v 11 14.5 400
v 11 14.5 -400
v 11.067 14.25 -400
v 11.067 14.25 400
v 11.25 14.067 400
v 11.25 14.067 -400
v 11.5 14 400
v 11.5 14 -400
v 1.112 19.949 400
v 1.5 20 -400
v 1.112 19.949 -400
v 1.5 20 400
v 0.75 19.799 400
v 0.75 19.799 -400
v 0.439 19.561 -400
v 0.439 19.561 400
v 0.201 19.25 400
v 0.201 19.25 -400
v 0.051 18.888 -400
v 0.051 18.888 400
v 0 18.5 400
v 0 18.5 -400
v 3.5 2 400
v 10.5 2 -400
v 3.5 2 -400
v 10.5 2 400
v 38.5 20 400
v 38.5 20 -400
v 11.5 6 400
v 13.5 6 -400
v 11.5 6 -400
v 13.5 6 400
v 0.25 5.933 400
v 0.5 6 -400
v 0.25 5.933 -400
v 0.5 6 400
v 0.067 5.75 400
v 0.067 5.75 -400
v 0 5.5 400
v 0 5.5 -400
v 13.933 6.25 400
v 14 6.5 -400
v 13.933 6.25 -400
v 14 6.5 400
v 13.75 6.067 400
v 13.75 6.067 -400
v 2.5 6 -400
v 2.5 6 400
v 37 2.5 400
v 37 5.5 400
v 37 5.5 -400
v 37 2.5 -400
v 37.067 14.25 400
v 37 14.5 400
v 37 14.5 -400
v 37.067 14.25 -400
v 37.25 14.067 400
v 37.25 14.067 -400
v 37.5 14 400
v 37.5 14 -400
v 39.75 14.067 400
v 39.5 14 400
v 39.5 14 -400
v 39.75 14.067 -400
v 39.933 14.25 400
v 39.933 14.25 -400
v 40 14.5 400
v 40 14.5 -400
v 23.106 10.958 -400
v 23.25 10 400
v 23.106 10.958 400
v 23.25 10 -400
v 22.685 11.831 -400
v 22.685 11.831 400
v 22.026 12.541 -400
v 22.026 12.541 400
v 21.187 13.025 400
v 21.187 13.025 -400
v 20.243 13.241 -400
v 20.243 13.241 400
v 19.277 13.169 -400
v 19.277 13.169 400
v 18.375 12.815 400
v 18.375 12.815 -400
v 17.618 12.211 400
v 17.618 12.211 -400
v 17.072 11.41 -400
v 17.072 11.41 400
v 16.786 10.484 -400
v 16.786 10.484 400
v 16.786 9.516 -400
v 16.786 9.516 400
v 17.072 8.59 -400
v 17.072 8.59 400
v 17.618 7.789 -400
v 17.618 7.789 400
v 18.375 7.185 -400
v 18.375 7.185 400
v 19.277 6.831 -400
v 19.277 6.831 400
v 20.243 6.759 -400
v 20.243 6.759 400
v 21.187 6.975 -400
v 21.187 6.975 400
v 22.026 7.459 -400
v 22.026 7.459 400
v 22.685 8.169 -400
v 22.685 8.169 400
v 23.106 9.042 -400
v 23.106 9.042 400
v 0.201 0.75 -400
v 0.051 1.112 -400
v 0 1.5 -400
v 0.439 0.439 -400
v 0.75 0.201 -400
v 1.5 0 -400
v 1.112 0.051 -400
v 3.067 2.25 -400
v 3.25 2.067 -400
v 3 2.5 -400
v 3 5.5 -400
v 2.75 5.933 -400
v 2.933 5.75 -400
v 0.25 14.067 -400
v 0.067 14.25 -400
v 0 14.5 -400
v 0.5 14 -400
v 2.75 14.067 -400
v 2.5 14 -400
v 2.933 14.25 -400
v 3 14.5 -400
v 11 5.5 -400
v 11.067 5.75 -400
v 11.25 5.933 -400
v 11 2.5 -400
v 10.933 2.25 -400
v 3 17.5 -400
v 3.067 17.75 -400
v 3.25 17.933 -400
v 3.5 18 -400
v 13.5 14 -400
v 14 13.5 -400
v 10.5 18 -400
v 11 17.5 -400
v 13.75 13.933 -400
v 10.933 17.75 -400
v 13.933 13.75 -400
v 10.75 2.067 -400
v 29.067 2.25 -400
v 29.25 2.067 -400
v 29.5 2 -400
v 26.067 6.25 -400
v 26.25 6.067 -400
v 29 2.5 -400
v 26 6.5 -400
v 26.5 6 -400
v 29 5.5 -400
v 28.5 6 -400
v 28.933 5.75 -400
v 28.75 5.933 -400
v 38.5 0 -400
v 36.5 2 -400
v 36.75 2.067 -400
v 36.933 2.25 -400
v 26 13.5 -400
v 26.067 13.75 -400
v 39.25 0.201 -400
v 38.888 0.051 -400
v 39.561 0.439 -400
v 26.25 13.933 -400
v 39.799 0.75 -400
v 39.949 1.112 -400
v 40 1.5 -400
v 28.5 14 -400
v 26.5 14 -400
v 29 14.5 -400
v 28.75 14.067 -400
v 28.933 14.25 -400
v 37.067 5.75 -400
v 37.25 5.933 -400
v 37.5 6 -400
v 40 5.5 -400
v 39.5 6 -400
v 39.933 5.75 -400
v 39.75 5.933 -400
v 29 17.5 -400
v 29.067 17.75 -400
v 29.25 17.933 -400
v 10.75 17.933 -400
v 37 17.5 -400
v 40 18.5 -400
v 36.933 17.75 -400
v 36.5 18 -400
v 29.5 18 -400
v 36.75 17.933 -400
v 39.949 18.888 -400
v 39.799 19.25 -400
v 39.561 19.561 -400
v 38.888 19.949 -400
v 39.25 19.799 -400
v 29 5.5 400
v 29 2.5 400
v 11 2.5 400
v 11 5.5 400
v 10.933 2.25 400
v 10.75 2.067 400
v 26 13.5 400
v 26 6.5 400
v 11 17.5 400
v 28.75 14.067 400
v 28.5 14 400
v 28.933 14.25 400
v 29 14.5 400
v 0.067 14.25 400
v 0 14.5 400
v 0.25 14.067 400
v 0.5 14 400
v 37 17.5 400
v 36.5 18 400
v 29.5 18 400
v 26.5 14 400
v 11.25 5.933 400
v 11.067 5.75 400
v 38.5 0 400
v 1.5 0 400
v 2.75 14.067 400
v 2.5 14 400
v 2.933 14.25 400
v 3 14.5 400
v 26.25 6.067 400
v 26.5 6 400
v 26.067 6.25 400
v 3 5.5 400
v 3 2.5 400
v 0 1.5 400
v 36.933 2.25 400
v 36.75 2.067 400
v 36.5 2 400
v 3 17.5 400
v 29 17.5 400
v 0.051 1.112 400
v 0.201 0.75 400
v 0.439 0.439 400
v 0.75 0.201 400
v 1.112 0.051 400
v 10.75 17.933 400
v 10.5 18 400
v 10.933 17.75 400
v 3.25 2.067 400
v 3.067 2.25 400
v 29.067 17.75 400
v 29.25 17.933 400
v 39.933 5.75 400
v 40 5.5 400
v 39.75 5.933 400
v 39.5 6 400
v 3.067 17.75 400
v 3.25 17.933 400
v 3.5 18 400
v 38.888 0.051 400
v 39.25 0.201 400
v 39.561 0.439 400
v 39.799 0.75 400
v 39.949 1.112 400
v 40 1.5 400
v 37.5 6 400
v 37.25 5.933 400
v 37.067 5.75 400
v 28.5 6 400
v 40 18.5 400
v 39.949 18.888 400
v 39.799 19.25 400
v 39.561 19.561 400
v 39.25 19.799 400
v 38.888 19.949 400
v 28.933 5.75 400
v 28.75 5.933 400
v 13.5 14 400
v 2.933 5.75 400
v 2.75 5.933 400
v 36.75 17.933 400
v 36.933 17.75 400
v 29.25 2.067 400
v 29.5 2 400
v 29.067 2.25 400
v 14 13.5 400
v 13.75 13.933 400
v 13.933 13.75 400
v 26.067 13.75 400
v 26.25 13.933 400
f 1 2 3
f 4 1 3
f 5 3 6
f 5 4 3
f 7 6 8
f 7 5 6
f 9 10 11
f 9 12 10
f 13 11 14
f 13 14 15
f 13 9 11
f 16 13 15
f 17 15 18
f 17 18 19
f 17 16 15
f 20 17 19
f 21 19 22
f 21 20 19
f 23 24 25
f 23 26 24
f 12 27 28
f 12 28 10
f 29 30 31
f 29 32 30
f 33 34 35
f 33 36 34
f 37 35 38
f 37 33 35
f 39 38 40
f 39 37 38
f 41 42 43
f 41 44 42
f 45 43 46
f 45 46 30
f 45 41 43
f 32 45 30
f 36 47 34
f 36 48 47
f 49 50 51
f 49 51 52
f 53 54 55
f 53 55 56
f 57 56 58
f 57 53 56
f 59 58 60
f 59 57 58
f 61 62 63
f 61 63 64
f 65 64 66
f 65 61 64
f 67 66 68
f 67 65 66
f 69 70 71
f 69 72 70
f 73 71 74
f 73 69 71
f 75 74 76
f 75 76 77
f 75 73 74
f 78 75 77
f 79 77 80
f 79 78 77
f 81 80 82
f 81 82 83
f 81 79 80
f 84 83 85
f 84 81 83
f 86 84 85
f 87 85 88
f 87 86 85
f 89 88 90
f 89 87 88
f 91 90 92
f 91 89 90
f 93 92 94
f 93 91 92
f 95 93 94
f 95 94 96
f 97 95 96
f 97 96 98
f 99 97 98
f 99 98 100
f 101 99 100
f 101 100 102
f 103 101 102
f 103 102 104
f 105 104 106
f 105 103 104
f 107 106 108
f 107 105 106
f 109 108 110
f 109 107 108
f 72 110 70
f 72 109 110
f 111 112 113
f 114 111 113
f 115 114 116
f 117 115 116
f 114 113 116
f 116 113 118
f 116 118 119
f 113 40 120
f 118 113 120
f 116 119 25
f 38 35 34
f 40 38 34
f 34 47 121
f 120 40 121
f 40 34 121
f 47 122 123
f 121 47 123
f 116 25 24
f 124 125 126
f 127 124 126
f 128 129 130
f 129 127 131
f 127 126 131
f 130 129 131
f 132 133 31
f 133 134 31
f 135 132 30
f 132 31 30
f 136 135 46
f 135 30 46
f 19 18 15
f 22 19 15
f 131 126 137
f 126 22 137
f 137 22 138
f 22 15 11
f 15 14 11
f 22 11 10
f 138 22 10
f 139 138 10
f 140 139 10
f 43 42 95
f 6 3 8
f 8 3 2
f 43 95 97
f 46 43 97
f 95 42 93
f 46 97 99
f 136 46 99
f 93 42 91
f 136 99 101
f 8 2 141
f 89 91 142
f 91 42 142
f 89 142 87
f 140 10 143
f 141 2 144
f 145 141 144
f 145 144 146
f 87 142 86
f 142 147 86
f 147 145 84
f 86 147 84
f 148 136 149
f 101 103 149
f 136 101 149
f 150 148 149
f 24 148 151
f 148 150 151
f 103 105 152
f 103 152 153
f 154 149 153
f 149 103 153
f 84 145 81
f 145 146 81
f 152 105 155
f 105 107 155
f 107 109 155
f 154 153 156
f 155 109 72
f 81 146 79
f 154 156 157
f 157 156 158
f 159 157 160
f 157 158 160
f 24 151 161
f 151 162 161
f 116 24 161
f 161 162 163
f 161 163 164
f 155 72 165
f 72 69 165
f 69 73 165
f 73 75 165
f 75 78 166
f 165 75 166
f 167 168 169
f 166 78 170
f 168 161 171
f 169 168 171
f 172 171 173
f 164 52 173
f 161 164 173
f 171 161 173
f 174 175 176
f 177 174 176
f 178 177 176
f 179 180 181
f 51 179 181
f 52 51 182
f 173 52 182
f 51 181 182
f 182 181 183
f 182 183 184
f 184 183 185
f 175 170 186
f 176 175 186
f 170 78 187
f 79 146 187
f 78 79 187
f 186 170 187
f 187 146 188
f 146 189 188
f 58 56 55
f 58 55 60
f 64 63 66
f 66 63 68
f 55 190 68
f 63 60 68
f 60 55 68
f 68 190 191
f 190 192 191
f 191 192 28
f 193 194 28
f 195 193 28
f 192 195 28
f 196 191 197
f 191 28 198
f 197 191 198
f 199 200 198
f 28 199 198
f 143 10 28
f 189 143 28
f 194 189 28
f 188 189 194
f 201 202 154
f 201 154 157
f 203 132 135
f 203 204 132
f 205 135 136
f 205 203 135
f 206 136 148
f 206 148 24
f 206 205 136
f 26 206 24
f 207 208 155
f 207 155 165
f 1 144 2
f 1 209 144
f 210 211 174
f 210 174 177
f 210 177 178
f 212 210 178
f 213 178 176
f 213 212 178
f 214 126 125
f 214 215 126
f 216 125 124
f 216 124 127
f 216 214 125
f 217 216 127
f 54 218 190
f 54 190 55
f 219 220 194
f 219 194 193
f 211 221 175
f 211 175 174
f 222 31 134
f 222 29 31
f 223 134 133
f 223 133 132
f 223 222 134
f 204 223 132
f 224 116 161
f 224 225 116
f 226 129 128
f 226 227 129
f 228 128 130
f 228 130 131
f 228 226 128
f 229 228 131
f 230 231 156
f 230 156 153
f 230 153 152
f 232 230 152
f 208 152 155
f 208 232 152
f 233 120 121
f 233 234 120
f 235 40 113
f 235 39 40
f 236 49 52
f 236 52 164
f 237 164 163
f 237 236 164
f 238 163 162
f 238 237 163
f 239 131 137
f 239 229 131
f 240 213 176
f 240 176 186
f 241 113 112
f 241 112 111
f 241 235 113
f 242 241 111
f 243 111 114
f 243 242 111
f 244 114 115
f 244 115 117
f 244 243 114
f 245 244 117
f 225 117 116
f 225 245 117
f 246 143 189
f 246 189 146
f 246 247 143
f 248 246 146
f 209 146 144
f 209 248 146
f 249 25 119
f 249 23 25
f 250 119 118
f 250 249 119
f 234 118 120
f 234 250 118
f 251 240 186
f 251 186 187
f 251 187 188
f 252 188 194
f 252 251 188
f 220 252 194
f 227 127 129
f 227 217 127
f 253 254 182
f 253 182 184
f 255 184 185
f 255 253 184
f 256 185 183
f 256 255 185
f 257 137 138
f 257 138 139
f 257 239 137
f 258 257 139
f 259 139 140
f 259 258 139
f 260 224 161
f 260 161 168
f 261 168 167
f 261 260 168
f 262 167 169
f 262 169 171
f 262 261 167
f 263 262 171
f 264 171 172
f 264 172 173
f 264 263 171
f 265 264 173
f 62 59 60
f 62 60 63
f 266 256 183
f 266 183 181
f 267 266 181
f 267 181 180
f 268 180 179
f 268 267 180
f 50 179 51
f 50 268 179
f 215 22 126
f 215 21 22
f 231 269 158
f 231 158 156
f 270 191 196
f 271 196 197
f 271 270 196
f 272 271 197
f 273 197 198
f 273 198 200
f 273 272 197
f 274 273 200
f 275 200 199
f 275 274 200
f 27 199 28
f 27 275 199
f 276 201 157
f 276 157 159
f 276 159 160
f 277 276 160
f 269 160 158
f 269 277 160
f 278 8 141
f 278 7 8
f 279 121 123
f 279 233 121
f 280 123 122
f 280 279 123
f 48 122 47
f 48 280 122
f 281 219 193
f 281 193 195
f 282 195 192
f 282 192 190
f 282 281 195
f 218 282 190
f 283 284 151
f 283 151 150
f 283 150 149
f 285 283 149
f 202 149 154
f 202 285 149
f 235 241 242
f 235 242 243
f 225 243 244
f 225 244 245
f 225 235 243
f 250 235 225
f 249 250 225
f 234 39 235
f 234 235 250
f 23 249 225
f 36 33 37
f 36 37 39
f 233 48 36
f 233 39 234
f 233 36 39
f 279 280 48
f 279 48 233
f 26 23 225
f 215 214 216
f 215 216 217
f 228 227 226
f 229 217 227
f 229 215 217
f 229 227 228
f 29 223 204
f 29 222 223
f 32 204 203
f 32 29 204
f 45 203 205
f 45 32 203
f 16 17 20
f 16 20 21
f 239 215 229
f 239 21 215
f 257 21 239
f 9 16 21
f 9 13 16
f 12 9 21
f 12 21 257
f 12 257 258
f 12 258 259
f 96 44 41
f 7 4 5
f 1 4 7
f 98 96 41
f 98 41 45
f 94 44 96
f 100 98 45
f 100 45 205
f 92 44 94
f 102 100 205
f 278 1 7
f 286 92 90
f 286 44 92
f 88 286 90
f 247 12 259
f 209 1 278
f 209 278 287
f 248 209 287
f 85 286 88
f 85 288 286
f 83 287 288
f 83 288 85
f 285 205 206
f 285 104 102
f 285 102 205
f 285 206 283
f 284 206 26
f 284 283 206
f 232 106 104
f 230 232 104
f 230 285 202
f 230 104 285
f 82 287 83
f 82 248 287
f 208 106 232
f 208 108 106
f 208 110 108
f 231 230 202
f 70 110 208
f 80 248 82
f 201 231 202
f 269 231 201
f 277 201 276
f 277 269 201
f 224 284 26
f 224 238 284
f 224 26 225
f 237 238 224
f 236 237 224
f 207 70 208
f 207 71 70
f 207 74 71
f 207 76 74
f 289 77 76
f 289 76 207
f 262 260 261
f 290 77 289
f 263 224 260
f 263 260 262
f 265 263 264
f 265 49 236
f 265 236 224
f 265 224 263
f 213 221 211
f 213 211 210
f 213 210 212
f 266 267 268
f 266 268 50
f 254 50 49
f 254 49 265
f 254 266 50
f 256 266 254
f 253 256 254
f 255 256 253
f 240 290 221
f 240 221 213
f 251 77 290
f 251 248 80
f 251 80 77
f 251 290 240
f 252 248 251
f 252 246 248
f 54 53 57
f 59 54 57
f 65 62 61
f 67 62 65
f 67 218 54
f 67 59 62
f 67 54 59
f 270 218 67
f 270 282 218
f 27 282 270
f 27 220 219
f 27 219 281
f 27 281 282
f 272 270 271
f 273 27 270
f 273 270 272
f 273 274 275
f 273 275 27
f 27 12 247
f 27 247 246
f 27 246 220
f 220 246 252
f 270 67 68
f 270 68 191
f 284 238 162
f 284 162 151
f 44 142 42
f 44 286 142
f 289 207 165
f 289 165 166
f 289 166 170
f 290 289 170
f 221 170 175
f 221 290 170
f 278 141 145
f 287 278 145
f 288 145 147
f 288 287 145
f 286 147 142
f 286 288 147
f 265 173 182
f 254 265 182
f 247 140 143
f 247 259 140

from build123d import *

# Parameters (mm, degrees)
SKETCH1_R           = 3.25
BOSS_EXTRUDE1_DEPTH = 400


with BuildPart() as part:
    # Sketch1 → Boss-Extrude1 (new, symmetric)
    with BuildSketch(Plane.XY):
        with BuildLine():
            Line((1.5, 0), (38.5, 0))
            ThreePointArc((38.5, 0), (39.560660172, 0.439339828), (40, 1.5))
            Line((40, 1.5), (40, 5.5))
            ThreePointArc((40, 5.5), (39.853553391, 5.853553391), (39.5, 6))
            Line((39.5, 6), (37.5, 6))
            ThreePointArc((37.5, 6), (37.146446609, 5.853553391), (37, 5.5))
            Line((37, 5.5), (37, 2.5))
            ThreePointArc((37, 2.5), (36.853553391, 2.146446609), (36.5, 2))
            Line((36.5, 2), (29.5, 2))
            ThreePointArc((29.5, 2), (29.146446609, 2.146446609), (29, 2.5))
            Line((29, 2.5), (29, 5.5))
            ThreePointArc((29, 5.5), (28.853553391, 5.853553391), (28.5, 6))
            Line((28.5, 6), (26.5, 6))
            ThreePointArc((26.5, 6), (26.146446609, 6.146446609), (26, 6.5))
            Line((26, 6.5), (26, 13.5))
            ThreePointArc((26, 13.5), (26.146446609, 13.853553391), (26.5, 14))
            Line((26.5, 14), (28.5, 14))
            ThreePointArc((28.5, 14), (28.853553391, 14.146446609), (29, 14.5))
            Line((29, 14.5), (29, 17.5))
            ThreePointArc((29, 17.5), (29.146446609, 17.853553391), (29.5, 18))
            Line((29.5, 18), (36.5, 18))
            ThreePointArc((36.5, 18), (36.853553391, 17.853553391), (37, 17.5))
            Line((37, 17.5), (37, 14.5))
            ThreePointArc((37, 14.5), (37.146446609, 14.146446609), (37.5, 14))
            Line((37.5, 14), (39.5, 14))
            ThreePointArc((39.5, 14), (39.853553391, 14.146446609), (40, 14.5))
            Line((40, 14.5), (40, 18.5))
            ThreePointArc((40, 18.5), (39.560660172, 19.560660172), (38.5, 20))
            Line((38.5, 20), (1.5, 20))
            ThreePointArc((1.5, 20), (0.439339828, 19.560660172), (0, 18.5))
            Line((0, 18.5), (0, 14.5))
            ThreePointArc((0, 14.5), (0.146446609, 14.146446609), (0.5, 14))
            Line((0.5, 14), (2.5, 14))
            ThreePointArc((2.5, 14), (2.853553391, 14.146446609), (3, 14.5))
            Line((3, 14.5), (3, 17.5))
            ThreePointArc((3, 17.5), (3.146446609, 17.853553391), (3.5, 18))
            Line((3.5, 18), (10.5, 18))
            ThreePointArc((10.5, 18), (10.853553391, 17.853553391), (11, 17.5))
            Line((11, 17.5), (11, 14.5))
            ThreePointArc((11, 14.5), (11.146446609, 14.146446609), (11.5, 14))
            Line((11.5, 14), (13.5, 14))
            ThreePointArc((13.5, 14), (13.853553391, 13.853553391), (14, 13.5))
            Line((14, 13.5), (14, 6.5))
            ThreePointArc((14, 6.5), (13.853553391, 6.146446609), (13.5, 6))
            Line((13.5, 6), (11.5, 6))
            ThreePointArc((11.5, 6), (11.146446609, 5.853553391), (11, 5.5))
            Line((11, 5.5), (11, 2.5))
            ThreePointArc((11, 2.5), (10.853553391, 2.146446609), (10.5, 2))
            Line((10.5, 2), (3.5, 2))
            ThreePointArc((3.5, 2), (3.146446609, 2.146446609), (3, 2.5))
            Line((3, 2.5), (3, 5.5))
            ThreePointArc((3, 5.5), (2.853553391, 5.853553391), (2.5, 6))
            Line((2.5, 6), (0.5, 6))
            ThreePointArc((0.5, 6), (0.146446609, 5.853553391), (0, 5.5))
            Line((0, 5.5), (0, 1.5))
            ThreePointArc((0, 1.5), (0.439339828, 0.439339828), (1.5, 0))
        make_face()
        with Locations((20, 10)):
            Circle(SKETCH1_R, mode=Mode.SUBTRACT)
    extrude(amount=BOSS_EXTRUDE1_DEPTH, both=True)


solid = part.part
